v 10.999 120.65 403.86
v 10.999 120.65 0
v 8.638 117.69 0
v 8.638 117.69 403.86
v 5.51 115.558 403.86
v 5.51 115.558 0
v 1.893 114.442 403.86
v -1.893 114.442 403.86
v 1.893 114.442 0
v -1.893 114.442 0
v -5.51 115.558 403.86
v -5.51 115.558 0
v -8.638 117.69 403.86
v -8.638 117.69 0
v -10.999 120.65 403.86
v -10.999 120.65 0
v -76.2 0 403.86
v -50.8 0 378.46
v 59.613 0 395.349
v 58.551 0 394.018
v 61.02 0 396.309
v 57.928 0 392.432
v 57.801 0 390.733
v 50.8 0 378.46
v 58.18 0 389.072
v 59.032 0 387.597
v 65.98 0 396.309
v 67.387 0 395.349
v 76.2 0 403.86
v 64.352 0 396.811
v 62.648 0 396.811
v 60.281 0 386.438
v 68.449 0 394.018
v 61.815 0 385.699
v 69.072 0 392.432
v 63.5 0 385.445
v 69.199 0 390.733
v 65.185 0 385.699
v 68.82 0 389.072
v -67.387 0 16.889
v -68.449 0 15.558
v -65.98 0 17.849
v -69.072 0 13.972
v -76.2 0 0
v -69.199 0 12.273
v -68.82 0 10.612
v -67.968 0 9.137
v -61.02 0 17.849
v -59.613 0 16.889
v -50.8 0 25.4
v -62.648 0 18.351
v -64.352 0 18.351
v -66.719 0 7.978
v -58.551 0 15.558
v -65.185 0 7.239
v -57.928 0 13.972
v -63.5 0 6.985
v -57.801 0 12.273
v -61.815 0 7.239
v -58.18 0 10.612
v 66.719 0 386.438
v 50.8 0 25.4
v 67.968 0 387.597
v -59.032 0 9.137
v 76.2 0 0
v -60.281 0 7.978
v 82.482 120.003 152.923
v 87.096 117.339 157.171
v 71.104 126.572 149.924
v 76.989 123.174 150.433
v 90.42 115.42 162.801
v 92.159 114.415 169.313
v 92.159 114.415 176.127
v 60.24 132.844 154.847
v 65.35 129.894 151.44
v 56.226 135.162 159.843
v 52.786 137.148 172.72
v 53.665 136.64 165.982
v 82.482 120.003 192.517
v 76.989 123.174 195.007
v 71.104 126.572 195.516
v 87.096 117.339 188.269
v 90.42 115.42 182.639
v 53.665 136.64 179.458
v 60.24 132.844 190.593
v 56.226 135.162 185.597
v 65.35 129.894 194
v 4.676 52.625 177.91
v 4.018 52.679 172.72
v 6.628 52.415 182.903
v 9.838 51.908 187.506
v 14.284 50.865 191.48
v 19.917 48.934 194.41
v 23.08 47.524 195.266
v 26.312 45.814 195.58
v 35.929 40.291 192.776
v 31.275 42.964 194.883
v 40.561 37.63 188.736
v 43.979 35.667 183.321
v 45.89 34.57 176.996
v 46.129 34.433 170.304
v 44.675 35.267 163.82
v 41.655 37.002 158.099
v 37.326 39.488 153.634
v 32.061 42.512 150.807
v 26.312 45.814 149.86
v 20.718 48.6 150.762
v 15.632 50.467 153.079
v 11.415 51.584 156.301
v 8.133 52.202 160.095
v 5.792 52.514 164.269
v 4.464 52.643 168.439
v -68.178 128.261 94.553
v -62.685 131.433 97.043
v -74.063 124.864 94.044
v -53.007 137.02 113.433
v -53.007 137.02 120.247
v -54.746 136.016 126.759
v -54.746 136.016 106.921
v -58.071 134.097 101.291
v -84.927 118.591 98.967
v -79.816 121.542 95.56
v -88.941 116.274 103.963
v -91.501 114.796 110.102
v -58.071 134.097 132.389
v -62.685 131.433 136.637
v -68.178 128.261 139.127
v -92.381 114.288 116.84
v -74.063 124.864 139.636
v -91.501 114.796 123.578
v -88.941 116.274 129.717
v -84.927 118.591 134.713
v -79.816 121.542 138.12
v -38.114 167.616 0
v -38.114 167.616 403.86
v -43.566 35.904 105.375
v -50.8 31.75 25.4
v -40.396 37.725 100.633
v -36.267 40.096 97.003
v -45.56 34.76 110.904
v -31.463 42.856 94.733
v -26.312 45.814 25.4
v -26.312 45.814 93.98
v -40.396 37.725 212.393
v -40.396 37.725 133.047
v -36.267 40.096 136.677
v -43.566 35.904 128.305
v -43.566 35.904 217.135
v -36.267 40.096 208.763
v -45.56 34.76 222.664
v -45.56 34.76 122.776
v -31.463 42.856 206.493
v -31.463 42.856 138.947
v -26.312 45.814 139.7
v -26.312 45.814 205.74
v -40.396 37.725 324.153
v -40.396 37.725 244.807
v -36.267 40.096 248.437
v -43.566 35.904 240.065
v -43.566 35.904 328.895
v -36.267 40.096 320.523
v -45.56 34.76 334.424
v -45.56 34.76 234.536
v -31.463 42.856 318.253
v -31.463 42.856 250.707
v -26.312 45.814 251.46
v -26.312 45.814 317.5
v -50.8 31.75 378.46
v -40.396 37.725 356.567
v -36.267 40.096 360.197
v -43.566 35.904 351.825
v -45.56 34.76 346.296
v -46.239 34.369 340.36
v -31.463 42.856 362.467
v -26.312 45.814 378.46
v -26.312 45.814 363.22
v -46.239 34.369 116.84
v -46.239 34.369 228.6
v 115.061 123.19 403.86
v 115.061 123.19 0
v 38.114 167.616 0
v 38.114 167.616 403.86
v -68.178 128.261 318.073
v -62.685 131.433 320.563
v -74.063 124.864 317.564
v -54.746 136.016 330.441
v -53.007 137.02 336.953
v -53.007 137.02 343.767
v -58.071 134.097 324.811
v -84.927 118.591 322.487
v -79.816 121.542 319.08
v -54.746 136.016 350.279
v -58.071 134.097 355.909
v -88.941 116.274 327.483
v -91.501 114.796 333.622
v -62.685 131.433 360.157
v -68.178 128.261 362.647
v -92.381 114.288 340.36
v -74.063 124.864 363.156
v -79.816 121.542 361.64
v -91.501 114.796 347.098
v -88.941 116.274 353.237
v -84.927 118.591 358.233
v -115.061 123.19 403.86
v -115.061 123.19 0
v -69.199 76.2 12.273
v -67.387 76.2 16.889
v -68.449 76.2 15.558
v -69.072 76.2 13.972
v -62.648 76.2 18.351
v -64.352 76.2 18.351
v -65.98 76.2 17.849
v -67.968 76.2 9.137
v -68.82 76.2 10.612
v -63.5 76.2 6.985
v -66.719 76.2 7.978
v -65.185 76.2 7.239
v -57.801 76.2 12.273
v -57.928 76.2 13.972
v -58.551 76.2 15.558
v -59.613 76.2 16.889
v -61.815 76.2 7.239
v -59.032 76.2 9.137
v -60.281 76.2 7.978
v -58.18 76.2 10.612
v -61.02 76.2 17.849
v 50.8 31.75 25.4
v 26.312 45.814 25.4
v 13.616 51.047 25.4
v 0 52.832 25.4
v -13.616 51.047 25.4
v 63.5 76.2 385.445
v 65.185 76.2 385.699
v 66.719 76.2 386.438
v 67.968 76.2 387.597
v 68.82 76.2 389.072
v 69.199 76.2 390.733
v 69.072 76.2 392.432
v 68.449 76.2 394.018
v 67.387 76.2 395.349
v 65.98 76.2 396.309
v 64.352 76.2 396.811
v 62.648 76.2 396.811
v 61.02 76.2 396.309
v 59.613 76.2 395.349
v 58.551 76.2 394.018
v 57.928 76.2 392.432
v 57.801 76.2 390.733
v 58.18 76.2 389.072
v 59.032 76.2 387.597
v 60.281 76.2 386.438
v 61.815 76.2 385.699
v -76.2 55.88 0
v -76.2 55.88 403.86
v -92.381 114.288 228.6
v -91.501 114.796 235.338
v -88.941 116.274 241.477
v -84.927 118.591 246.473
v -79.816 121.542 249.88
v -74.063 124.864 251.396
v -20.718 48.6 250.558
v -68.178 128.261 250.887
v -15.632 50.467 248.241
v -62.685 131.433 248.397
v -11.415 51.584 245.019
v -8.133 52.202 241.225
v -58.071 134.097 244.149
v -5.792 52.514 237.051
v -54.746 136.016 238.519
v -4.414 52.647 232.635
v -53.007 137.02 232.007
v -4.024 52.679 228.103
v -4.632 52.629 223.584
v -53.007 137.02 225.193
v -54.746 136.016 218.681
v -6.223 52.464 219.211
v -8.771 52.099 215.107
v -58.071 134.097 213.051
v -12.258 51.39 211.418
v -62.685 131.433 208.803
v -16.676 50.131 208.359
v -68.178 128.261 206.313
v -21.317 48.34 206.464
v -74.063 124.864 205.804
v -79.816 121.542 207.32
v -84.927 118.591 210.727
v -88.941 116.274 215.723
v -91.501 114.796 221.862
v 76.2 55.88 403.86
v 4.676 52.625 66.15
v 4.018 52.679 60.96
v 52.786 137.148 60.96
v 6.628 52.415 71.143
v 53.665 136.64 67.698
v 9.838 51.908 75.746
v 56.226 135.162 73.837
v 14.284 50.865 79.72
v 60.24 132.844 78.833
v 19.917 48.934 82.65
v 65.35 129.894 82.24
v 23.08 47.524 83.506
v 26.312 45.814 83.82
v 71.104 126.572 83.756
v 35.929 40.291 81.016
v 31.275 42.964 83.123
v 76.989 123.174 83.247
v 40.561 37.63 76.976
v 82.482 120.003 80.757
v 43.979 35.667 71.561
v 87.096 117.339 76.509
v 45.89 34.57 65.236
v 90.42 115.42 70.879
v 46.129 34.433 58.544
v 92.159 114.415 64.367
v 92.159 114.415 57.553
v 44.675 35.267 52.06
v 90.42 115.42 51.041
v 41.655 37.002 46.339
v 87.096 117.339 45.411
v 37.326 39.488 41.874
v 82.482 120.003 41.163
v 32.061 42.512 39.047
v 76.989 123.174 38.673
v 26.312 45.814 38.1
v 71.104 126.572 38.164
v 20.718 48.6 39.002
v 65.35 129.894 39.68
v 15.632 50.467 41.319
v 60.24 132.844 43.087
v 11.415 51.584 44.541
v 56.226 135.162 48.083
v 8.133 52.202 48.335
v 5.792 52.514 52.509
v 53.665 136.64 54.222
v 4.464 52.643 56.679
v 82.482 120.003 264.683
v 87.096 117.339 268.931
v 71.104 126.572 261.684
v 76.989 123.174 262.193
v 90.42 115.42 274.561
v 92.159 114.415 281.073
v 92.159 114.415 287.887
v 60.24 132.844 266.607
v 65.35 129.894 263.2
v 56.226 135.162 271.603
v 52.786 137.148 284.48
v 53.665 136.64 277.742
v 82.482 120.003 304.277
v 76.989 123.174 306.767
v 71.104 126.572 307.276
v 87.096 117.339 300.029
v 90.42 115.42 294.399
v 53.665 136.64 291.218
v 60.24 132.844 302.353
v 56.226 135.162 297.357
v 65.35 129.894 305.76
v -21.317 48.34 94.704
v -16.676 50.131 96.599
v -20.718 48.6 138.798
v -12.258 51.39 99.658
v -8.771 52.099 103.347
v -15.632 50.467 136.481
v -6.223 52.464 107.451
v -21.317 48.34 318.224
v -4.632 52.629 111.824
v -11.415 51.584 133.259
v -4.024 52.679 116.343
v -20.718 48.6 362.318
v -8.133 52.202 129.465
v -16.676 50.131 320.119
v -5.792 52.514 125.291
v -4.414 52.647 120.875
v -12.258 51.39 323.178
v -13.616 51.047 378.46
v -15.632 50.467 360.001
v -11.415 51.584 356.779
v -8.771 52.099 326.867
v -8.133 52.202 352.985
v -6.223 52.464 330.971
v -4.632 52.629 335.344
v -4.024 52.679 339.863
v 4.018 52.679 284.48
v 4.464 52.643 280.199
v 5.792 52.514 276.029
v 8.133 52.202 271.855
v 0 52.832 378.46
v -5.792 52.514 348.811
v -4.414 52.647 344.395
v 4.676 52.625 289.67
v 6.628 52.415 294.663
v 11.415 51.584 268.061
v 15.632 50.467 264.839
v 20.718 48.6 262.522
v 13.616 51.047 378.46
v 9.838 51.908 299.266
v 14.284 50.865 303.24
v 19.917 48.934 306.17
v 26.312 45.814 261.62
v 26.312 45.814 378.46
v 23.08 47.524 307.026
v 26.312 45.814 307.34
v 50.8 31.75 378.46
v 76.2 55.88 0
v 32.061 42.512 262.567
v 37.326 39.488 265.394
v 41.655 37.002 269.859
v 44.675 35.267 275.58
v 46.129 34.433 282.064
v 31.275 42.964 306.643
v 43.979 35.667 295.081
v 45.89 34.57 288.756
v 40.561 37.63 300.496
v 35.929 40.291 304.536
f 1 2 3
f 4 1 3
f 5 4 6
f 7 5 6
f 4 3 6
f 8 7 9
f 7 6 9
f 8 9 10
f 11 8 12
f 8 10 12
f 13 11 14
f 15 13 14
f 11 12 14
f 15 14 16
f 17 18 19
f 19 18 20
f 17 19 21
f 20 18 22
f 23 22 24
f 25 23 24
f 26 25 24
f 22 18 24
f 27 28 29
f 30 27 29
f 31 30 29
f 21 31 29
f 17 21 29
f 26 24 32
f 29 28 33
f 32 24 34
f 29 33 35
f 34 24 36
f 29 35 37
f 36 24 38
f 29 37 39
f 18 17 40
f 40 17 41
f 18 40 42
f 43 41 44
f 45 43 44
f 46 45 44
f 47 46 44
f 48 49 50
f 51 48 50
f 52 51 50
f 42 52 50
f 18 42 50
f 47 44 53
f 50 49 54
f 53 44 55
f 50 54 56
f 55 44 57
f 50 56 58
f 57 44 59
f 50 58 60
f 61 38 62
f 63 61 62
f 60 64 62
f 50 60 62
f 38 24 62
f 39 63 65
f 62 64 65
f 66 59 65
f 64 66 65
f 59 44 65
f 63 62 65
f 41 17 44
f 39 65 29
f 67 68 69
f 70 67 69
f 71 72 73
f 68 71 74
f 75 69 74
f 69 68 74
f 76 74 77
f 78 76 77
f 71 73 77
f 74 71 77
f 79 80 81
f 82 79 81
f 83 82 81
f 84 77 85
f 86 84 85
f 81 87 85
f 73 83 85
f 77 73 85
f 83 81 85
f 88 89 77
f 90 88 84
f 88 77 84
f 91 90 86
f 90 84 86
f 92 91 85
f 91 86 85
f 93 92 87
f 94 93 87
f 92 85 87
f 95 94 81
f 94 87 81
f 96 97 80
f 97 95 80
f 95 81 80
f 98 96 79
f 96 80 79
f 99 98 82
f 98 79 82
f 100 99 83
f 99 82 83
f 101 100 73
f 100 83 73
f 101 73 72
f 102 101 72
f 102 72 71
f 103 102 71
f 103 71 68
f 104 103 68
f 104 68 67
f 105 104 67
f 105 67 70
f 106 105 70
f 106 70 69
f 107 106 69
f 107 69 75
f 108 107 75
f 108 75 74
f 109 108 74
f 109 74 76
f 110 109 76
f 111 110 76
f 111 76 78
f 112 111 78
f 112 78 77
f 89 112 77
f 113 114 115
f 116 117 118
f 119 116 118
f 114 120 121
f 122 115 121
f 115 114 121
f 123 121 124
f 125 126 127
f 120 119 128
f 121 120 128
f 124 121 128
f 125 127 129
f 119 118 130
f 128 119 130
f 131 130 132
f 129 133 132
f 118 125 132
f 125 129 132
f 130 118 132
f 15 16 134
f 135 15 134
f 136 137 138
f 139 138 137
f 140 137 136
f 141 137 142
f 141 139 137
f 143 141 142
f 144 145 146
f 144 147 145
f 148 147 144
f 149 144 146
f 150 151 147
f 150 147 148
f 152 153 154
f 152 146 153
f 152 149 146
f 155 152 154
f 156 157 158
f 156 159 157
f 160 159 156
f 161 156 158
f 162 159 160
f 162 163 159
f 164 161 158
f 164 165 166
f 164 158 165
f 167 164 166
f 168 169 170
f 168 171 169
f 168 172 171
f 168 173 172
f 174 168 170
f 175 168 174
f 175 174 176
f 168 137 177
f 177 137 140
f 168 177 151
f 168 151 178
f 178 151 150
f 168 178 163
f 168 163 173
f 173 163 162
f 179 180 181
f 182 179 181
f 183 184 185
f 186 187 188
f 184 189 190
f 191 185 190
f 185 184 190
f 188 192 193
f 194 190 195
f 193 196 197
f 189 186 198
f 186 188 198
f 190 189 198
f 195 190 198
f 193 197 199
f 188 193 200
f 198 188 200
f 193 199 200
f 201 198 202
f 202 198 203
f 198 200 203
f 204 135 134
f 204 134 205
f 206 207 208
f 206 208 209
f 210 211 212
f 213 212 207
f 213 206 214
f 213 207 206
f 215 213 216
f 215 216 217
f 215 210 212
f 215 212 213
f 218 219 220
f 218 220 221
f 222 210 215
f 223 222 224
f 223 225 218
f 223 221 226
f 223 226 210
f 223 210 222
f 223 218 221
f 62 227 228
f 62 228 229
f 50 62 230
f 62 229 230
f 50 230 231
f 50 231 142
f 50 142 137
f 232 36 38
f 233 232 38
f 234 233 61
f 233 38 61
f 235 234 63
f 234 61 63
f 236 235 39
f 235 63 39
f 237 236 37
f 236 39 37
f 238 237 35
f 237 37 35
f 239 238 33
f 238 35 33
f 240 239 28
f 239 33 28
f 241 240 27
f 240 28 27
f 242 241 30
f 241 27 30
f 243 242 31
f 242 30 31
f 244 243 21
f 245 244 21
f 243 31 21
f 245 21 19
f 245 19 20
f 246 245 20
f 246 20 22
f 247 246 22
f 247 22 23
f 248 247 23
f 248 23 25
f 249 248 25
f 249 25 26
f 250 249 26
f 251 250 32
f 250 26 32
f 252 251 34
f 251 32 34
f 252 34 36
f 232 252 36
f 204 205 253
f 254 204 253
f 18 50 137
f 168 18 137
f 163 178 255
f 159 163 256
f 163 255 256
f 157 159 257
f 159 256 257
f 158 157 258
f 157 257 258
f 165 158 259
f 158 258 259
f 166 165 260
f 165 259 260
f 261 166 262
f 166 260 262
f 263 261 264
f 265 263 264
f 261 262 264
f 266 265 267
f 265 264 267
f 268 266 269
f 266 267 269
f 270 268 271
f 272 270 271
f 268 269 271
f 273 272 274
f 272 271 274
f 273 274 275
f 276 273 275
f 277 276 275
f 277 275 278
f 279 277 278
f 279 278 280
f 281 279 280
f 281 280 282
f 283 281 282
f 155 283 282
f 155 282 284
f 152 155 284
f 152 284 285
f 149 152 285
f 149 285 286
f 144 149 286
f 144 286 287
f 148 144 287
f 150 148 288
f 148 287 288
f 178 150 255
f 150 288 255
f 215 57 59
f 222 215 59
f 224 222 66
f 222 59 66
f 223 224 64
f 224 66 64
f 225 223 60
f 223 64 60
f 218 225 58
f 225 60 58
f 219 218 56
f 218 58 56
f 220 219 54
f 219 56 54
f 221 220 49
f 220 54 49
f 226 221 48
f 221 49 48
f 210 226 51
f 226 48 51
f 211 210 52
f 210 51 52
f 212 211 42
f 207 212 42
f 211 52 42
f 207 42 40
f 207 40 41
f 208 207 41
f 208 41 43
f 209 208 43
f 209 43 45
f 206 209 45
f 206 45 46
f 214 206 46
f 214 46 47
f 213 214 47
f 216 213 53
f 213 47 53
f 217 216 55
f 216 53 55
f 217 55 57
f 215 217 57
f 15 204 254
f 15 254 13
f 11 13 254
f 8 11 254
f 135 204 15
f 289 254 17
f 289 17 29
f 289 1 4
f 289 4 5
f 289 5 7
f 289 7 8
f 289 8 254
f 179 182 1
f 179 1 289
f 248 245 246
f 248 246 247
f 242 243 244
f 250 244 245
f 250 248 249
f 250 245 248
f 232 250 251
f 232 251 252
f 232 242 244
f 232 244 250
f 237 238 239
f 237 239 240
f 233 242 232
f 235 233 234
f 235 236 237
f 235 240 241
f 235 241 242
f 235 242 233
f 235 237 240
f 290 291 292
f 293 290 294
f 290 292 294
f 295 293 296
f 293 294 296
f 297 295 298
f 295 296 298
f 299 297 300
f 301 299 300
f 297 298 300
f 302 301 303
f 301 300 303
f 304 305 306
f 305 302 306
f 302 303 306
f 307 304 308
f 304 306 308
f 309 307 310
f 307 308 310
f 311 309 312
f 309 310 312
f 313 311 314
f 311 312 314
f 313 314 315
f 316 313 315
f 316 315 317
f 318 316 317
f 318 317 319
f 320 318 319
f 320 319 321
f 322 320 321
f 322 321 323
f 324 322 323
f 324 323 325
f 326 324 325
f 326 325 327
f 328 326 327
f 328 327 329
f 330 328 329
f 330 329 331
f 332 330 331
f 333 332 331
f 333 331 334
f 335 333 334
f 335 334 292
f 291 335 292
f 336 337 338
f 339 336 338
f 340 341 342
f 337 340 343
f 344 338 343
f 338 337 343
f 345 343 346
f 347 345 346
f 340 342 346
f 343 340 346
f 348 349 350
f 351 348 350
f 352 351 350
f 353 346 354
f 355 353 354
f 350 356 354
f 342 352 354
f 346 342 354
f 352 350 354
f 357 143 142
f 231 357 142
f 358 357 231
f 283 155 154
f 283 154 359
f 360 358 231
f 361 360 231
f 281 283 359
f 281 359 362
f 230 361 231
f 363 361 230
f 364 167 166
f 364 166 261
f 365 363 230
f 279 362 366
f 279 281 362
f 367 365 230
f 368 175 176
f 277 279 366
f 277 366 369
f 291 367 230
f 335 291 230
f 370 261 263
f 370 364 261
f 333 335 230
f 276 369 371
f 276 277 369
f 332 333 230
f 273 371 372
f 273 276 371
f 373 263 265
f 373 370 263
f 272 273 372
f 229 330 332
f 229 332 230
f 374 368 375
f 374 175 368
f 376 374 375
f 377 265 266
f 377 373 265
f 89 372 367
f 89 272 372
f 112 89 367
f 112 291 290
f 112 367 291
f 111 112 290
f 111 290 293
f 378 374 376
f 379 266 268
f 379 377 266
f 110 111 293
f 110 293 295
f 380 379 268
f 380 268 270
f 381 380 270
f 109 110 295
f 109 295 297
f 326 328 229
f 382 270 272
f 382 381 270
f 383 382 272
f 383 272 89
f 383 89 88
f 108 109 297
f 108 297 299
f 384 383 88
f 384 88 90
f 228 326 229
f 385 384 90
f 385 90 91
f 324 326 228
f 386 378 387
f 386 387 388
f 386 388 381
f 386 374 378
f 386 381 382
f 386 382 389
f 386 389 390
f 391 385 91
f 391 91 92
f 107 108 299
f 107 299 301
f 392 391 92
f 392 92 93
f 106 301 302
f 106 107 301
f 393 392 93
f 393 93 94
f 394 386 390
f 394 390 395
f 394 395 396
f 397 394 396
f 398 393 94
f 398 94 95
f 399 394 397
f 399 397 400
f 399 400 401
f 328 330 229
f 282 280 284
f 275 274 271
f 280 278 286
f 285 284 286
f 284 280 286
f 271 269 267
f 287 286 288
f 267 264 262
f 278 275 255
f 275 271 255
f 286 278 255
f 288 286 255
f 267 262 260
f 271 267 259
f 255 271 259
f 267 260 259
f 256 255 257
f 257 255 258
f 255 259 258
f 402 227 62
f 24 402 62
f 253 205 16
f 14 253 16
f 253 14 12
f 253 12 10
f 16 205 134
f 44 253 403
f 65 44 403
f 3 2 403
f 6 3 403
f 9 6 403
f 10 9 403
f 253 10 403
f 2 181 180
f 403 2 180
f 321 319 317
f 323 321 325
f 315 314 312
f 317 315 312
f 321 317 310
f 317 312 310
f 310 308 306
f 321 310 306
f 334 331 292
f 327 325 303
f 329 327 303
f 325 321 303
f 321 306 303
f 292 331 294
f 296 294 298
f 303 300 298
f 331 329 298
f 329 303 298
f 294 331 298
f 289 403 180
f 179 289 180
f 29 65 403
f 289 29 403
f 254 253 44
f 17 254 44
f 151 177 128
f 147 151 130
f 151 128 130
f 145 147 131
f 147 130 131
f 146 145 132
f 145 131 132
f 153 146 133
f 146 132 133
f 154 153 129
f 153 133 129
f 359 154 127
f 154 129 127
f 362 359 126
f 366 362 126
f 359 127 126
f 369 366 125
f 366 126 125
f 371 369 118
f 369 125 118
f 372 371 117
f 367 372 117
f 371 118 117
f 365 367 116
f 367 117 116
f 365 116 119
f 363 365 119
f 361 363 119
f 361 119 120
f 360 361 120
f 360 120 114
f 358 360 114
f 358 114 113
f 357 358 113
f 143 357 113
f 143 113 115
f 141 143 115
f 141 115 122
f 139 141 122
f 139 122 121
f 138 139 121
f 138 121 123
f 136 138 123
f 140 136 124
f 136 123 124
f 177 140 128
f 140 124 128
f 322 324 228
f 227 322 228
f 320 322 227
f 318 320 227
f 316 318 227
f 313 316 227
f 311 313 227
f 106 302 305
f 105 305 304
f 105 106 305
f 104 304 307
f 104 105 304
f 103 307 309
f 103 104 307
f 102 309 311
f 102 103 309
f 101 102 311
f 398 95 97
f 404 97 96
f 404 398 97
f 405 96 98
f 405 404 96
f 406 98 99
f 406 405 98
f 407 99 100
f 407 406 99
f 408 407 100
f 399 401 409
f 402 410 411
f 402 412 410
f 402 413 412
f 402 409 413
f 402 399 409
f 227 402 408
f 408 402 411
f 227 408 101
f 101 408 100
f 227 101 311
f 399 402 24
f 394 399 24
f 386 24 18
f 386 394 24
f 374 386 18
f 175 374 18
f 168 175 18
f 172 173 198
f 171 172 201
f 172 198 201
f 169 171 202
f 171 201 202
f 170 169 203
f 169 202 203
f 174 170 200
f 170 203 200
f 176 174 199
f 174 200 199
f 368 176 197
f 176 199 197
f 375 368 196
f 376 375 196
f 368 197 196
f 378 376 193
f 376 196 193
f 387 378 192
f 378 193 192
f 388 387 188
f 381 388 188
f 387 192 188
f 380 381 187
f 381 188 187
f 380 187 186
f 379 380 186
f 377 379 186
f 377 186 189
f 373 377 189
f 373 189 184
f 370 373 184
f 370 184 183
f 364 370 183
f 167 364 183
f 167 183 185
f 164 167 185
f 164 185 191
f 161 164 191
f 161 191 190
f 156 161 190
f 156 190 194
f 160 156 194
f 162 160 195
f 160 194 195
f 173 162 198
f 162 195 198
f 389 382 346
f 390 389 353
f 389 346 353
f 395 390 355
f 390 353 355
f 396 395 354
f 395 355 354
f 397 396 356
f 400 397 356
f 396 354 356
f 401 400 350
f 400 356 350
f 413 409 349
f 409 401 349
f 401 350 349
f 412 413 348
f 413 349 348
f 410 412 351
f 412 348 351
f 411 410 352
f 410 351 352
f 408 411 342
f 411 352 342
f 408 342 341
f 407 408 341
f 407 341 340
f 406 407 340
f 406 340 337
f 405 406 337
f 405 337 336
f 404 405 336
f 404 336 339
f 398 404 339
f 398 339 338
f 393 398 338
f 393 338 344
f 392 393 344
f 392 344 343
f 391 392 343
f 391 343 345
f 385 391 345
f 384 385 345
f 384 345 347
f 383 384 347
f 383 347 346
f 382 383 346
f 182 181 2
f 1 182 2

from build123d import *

# Parameters (mm, degrees)
BOSS_EXTRUDE1_DEPTH = 403.86
CUT_EXTRUDE2_START  = -25.4
CUT_EXTRUDE2_DEPTH  = 353.06
CUT_EXTRUDE5_START  = -19.05
SKETCH3_R           = 22.86
CUT_EXTRUDE5_DEPTH  = 353.06
CUT_EXTRUDE6_START  = -19.05
SKETCH4_R           = 22.86
CUT_EXTRUDE6_DEPTH  = 353.06
SKETCH5_R           = 5.715
CUT_EXTRUDE7_DEPTH  = 76.2


with BuildPart() as part:
    # Sketch1 → Boss-Extrude1 (new body)
    with BuildSketch(Plane.XY):
        with BuildLine():
            Line((-10.998522628, 120.65), (-38.114105889, 167.615567884))
            Line((-38.114105889, 167.615567884), (-115.061446619, 123.19))
            Line((-115.061446619, 123.19), (-76.2, 55.88))
            Line((-76.2, 55.88), (-76.2, 0))
            Line((-76.2, 0), (76.2, 0))
            Line((76.2, 0), (76.2, 55.88))
            Line((76.2, 55.88), (115.061446619, 123.19))
            Line((115.061446619, 123.19), (38.114105889, 167.615567884))
            Line((38.114105889, 167.615567884), (10.998522628, 120.65))
            ThreePointArc((10.998522628, 120.65), (0, 114.3), (-10.998522628, 120.65))
        make_face()
    extrude(amount=BOSS_EXTRUDE1_DEPTH)

    # Sketch2 → Cut-Extrude2 (cut)
    with BuildSketch(Plane.XY.offset(403.86).offset(CUT_EXTRUDE2_START)):
        with BuildLine():
            Line((26.311519178, 45.814017315), (50.8, 31.75))
            Line((50.8, 31.75), (50.8, 0))
            Line((50.8, 0), (-50.8, 0))
            Line((-50.8, 0), (-50.8, 31.75))
            Line((-50.8, 31.75), (-26.311519178, 45.814017315))
            ThreePointArc((-26.311519178, 45.814017315), (0, 52.832), (26.311519178, 45.814017315))
        make_face()
    extrude(amount=-CUT_EXTRUDE2_DEPTH, mode=Mode.SUBTRACT)

    # Sketch3 → Cut-Extrude5 (cut)
    with BuildSketch(Plane(origin=(82.108196401, 142.215567884, 0), x_dir=(0.8660254037844397, -0.4999999999999981, 0), z_dir=(0.4999999999999982, 0.8660254037844398, 0)).offset(CUT_EXTRUDE5_START)):
        with Locations(Location((0, -60.96, 0), (0, 0, 180))):
            Circle(SKETCH3_R)
        with Locations(Location((0, -172.72, 0), (0, 0, 180))):
            Circle(SKETCH3_R)
        with Locations(Location((0, -284.48, 0), (0, 0, 180))):
            Circle(SKETCH3_R)
    extrude(amount=-CUT_EXTRUDE5_DEPTH, mode=Mode.SUBTRACT)

    # Sketch4 → Cut-Extrude6 (cut)
    with BuildSketch(Plane(origin=(-82.108196401, 142.215567884, 0), x_dir=(0.866025403784438, 0.5000000000000011, 0), z_dir=(-0.5000000000000011, 0.8660254037844382, 0)).offset(CUT_EXTRUDE6_START)):
        with Locations(Location((0, -340.36, 0), (0, 0, 180))):
            Circle(SKETCH4_R)
        with Locations(Location((0, -228.6, 0), (0, 0, 180))):
            Circle(SKETCH4_R)
        with Locations(Location((0, -116.84, 0), (0, 0, 180))):
            Circle(SKETCH4_R)
    extrude(amount=-CUT_EXTRUDE6_DEPTH, mode=Mode.SUBTRACT)

    # Sketch5 → Cut-Extrude7 (cut)
    with BuildSketch(Plane.XZ):
        with Locations(Location((-63.5, 12.7, 0), (0, 0, 270))):
            Circle(SKETCH5_R)
        with Locations(Location((63.5, 391.16, 0), (0, 0, 270))):
            Circle(SKETCH5_R)
    extrude(amount=-CUT_EXTRUDE7_DEPTH, mode=Mode.SUBTRACT)


solid = part.part
